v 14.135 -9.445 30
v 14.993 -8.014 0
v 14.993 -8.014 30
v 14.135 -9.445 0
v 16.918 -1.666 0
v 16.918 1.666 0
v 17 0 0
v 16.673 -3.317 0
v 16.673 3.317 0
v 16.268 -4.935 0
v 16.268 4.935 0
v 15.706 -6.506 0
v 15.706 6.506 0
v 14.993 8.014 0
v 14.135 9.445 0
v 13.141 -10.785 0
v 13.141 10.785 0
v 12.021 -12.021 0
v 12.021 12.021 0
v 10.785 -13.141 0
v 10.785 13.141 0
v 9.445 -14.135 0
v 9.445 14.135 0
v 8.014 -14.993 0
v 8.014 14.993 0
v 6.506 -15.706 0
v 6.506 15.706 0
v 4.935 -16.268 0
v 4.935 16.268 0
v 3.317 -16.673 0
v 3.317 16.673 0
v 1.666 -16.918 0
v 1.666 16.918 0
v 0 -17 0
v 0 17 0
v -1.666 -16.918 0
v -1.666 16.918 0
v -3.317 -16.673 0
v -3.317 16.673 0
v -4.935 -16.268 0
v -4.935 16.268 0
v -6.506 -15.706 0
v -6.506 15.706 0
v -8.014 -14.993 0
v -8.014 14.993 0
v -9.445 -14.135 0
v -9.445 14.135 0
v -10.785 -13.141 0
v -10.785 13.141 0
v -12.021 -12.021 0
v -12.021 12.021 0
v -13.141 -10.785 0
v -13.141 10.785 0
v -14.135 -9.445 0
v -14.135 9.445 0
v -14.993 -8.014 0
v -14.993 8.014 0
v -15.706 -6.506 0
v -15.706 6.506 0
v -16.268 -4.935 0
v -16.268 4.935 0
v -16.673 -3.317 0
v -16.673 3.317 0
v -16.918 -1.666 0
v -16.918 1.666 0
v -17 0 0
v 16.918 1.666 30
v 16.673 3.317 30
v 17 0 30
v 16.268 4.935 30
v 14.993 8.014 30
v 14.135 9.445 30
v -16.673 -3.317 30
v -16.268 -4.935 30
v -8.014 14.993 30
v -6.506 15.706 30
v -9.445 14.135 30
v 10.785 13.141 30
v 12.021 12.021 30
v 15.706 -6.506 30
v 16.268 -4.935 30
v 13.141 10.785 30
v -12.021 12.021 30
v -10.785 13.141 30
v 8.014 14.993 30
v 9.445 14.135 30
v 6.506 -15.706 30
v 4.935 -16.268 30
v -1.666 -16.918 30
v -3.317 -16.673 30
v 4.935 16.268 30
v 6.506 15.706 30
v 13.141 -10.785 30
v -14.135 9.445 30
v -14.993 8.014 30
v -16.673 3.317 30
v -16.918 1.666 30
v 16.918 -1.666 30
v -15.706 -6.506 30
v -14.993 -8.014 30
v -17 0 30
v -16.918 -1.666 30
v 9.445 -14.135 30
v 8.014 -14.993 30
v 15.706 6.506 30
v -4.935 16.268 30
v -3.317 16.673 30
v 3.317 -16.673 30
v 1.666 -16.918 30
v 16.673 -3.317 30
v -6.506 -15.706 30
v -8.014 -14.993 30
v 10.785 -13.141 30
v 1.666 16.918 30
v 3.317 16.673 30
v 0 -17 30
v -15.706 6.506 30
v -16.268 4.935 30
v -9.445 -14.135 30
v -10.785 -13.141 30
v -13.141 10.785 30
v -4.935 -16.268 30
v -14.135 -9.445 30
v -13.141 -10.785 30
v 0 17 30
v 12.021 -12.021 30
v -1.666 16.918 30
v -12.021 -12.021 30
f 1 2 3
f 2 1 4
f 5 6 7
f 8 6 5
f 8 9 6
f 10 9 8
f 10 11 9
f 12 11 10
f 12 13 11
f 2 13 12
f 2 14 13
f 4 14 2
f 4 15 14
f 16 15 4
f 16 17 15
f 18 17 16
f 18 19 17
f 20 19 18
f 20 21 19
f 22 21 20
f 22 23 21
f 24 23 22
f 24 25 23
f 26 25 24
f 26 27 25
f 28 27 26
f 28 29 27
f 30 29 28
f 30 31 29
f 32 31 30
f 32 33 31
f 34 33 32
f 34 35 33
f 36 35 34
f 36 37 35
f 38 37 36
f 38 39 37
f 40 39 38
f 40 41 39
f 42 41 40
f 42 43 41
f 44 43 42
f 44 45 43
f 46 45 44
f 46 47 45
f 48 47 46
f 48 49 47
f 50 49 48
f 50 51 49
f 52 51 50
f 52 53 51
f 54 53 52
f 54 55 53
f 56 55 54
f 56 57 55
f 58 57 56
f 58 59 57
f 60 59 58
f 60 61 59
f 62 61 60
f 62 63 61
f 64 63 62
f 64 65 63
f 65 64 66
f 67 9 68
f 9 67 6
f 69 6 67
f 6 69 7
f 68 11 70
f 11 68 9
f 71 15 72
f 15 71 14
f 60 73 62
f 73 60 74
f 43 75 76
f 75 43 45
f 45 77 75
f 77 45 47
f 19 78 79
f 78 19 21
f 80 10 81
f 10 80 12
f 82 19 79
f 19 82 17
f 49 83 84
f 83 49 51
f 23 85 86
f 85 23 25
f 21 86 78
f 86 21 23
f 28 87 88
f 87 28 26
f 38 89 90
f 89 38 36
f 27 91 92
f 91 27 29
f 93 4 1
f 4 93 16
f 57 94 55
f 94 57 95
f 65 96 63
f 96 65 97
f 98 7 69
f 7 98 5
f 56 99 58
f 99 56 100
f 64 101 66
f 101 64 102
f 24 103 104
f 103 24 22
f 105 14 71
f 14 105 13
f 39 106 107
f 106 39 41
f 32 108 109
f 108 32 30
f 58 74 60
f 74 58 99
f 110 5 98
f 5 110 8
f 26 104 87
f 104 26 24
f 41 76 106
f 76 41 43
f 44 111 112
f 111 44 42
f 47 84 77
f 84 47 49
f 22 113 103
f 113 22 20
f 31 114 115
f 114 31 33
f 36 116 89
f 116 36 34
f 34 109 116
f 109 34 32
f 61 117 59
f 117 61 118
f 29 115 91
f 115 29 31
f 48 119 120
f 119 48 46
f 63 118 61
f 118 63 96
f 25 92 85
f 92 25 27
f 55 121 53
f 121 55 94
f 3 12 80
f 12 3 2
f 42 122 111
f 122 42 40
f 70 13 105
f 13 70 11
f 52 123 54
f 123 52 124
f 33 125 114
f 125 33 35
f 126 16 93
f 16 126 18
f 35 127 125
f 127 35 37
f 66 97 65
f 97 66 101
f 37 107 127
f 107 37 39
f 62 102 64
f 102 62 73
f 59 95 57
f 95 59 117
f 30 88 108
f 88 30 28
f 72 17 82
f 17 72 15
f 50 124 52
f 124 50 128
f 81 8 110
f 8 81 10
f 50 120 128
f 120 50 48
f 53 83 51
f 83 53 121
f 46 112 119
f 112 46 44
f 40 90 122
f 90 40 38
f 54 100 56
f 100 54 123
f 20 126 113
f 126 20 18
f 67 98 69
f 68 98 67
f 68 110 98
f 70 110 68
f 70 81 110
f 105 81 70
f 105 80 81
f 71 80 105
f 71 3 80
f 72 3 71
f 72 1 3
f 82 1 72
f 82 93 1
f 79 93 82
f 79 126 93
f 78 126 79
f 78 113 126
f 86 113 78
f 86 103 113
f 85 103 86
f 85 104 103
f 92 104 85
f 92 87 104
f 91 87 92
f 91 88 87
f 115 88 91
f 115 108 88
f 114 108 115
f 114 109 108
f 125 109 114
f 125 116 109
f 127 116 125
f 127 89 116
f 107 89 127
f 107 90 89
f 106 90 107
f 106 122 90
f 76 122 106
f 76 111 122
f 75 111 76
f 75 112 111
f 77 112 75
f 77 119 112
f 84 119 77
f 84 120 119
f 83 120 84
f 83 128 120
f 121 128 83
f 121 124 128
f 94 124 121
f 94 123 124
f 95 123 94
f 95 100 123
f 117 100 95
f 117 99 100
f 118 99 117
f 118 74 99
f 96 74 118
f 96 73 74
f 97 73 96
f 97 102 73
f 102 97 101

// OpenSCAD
cylinder(d=34, h=30, $fn=64);  
translate([0, 0, 10])  
cylinder(d=30, h=20, $fn=64);
